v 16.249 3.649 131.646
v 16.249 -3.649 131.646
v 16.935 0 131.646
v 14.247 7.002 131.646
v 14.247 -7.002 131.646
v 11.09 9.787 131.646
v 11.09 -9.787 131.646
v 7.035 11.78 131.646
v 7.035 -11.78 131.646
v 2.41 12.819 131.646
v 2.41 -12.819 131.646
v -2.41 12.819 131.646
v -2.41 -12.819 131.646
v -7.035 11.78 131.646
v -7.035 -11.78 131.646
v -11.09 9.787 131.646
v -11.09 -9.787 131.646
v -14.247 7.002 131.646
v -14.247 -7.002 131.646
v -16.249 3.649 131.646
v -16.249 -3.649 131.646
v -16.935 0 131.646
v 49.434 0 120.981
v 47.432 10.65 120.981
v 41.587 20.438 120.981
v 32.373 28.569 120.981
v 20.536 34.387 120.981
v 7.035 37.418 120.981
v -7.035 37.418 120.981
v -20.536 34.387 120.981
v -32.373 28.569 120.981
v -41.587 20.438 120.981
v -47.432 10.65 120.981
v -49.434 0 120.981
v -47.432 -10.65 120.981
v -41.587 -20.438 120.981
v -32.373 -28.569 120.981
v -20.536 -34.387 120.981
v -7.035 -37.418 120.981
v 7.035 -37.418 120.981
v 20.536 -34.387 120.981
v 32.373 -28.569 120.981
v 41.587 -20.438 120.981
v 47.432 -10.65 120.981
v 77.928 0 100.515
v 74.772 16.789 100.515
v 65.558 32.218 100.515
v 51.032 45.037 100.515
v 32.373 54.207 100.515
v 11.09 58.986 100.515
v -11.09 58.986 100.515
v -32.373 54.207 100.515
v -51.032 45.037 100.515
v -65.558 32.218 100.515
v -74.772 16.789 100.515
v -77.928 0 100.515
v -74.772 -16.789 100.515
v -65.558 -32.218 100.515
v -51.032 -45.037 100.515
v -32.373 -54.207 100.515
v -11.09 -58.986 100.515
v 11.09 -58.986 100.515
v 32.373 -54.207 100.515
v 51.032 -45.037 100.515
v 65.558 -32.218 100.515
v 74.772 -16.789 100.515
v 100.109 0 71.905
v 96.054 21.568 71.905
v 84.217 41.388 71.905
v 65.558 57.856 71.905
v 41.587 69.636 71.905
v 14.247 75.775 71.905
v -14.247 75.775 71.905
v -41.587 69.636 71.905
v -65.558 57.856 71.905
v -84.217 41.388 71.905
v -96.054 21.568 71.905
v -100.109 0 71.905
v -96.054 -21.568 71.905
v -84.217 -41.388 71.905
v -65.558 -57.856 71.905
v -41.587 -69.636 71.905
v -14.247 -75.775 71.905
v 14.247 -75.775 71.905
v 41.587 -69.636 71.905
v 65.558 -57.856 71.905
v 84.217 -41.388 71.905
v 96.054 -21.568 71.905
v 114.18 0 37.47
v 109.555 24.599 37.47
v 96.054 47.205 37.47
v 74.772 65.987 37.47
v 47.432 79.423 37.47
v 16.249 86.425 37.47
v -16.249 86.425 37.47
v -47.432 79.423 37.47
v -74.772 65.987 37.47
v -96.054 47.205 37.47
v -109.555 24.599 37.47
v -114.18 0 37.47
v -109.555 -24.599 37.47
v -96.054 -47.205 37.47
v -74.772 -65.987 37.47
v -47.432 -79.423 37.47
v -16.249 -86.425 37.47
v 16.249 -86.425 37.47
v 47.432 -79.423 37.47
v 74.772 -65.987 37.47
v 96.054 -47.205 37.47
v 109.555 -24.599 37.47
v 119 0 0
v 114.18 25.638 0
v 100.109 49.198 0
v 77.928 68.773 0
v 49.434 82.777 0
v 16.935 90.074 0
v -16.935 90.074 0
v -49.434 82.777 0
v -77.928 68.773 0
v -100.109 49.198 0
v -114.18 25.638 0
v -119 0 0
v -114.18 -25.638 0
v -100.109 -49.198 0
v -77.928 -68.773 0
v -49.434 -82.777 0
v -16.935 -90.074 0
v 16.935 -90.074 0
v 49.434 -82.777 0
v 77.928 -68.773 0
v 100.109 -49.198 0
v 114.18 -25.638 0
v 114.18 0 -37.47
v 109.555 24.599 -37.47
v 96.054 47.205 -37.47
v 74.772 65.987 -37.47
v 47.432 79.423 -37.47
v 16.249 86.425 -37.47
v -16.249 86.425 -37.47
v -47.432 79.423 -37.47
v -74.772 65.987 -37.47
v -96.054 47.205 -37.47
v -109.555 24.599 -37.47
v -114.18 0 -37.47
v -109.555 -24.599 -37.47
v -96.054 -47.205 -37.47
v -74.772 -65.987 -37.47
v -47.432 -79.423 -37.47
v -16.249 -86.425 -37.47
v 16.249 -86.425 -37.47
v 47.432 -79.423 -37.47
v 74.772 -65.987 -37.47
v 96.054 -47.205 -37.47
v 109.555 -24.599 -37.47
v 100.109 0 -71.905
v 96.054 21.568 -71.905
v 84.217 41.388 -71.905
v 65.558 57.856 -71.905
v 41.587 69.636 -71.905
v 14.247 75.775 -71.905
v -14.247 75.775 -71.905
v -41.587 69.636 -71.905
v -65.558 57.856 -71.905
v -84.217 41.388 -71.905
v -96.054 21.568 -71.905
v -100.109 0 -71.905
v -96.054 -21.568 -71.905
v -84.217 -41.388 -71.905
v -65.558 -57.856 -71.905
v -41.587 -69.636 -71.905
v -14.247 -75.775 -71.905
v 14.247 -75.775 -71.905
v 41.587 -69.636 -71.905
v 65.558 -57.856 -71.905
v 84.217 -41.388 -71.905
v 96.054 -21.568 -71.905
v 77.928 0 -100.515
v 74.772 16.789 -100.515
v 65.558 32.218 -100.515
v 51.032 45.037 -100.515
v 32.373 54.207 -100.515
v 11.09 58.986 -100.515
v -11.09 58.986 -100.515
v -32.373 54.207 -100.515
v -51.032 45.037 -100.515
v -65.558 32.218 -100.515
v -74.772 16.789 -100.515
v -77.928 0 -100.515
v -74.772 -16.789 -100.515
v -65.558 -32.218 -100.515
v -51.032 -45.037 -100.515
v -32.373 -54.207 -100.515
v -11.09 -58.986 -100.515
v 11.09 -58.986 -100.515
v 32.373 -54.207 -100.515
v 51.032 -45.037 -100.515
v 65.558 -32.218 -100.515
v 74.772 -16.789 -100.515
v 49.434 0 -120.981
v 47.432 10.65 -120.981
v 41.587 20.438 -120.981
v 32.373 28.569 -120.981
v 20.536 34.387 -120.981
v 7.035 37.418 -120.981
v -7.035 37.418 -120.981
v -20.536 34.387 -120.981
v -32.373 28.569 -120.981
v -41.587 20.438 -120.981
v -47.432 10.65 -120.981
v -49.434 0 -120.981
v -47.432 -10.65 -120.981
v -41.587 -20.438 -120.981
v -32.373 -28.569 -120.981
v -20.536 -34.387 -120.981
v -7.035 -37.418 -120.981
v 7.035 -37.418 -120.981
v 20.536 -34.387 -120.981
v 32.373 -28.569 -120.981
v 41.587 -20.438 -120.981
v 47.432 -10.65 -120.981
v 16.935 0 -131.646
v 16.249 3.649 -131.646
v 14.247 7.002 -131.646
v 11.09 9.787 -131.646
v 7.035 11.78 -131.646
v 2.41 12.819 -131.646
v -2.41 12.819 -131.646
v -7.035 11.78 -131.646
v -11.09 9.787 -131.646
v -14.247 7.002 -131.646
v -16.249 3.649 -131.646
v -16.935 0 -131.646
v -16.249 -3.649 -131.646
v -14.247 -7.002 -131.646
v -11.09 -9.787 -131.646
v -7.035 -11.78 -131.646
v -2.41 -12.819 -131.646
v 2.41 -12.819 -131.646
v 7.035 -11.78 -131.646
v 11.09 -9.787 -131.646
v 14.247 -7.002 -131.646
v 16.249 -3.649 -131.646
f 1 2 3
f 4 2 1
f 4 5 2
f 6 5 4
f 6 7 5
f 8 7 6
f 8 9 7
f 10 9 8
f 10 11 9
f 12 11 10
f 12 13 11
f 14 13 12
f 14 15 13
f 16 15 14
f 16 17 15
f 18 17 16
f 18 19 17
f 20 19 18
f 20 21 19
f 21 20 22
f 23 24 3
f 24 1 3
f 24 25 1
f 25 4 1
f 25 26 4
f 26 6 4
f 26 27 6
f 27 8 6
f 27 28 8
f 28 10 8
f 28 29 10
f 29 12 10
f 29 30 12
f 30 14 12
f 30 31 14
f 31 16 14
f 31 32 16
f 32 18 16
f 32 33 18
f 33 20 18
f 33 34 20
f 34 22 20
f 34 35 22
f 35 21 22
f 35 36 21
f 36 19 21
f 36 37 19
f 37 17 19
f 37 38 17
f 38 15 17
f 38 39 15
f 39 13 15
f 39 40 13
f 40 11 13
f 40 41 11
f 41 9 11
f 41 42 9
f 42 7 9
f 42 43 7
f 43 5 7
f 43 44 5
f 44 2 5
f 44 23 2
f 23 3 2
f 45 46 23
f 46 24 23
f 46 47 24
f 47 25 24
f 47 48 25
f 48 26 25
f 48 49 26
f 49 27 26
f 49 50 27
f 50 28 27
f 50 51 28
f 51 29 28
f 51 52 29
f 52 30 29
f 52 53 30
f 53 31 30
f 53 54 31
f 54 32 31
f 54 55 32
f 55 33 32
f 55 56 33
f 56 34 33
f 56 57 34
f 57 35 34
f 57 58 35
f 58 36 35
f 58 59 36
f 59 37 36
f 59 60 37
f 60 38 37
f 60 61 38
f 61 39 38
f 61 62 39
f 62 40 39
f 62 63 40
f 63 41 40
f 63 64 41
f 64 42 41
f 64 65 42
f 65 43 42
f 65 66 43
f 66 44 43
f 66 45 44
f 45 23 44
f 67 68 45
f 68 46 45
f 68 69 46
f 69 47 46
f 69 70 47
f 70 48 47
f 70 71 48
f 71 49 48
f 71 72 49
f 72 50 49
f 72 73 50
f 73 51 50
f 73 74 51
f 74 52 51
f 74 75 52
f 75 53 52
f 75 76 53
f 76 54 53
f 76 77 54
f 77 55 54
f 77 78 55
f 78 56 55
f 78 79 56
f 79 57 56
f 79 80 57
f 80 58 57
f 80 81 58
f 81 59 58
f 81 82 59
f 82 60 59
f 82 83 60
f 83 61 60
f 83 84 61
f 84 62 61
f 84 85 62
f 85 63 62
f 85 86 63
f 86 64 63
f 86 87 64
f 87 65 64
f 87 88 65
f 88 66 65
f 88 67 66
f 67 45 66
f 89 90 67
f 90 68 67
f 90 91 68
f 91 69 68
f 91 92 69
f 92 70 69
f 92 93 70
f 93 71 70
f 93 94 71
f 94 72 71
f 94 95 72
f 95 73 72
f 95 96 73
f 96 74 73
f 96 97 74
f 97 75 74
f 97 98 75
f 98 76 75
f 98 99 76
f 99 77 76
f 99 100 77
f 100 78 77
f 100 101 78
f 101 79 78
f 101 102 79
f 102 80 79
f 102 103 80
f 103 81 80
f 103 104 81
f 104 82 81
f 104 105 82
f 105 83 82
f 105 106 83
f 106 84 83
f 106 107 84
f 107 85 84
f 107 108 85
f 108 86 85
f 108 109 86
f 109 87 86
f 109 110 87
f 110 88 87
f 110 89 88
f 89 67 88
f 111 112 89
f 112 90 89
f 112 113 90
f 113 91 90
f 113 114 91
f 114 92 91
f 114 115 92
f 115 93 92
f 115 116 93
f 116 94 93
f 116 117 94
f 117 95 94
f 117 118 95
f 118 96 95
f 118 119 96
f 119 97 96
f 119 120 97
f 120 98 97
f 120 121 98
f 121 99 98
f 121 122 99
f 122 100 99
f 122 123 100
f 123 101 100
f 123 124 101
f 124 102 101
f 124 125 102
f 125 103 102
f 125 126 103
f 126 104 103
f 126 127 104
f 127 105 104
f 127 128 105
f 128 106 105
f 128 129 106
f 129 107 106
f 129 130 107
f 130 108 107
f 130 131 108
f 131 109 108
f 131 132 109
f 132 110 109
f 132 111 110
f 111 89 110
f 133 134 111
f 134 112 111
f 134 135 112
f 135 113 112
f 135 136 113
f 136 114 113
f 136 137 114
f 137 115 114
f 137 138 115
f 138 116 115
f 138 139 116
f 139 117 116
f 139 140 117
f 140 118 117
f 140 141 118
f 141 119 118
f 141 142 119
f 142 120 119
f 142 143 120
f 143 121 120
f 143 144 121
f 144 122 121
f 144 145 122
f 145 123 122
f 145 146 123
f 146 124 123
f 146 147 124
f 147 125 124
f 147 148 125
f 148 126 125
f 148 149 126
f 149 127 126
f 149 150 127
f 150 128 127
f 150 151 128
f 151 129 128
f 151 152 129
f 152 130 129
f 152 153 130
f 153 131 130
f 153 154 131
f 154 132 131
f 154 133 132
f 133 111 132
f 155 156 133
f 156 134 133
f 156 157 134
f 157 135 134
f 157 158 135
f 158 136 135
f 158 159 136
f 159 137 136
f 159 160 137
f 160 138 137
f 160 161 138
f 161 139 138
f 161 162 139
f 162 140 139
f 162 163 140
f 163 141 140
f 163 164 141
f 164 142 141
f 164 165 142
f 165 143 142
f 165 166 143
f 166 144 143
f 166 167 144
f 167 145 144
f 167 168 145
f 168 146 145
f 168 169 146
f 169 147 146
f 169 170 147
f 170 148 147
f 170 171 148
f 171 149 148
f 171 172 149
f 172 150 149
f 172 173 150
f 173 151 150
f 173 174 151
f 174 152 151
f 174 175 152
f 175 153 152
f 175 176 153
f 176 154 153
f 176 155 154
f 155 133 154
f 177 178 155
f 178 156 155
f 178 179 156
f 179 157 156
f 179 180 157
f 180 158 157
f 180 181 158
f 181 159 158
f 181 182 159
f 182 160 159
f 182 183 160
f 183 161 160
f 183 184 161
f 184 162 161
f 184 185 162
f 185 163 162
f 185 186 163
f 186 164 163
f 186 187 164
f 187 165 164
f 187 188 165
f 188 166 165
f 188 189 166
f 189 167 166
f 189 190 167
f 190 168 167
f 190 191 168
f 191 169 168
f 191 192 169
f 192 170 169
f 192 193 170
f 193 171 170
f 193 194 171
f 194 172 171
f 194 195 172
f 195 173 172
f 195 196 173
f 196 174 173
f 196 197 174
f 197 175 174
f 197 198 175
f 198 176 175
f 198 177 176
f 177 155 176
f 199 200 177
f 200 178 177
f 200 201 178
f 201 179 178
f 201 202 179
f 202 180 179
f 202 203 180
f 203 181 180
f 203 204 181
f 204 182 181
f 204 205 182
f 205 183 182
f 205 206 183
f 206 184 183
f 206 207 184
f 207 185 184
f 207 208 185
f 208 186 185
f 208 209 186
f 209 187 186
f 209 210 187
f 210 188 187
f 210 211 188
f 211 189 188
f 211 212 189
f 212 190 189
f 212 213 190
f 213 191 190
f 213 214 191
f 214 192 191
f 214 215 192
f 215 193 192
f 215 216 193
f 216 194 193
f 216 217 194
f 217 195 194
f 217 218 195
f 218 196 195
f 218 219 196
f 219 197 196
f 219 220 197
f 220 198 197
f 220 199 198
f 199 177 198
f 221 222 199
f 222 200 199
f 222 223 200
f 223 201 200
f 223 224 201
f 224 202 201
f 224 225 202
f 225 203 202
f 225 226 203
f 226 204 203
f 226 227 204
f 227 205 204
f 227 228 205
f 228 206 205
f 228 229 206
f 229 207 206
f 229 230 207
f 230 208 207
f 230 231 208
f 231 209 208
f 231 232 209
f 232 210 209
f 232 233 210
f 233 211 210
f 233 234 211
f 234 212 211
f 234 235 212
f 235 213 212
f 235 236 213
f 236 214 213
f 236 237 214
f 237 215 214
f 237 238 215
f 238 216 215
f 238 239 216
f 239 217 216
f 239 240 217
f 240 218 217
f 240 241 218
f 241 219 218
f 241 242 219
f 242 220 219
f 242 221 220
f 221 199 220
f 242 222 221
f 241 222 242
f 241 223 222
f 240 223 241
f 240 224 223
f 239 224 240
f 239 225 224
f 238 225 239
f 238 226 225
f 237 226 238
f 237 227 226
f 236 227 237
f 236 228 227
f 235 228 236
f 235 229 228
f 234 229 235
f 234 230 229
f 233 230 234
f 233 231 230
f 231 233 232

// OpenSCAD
// Generated by SolidPython 1.0.1 on 2020-07-29 00:46:53


scale(v = [17, 13, 19]) {
	sphere(r = 7);
}
/***********************************************
*********      SolidPython code:      **********
************************************************
 
# import packages: SolidPython
from solid import *
from solid.utils import *
from itertools import chain, combinations, permutations


class Resize:

    def __init__(self, scad_file):
        self.scad_file = scad_file
        #self.scad_file = import_scad(scad_file)
        # cone/cylinder param:
        self.r1 = 0
        self.r2 = 0
        self.h = 0
        # rectangular prism param:
        self.w = 0
        self.l = 0
        # ellipse param:
        self.r = 0

    # import OpenScad code (file name corresponds to shape)


    # classify shape + parameters
    def assign(self, param1, param2, param3):
        if self.scad_file == 'cone.scad':
            self.r1 = param1
            self.r2 = param2
            self.h = param3
        elif self.scad_file == 'cylinder.scad':
            self.r1 = param1
            self.r2 = param2
            self.h = param3
        elif self.scad_file == 'rectangularPrism.scad':
            self.h = param1
            self.l = param2
            self.w = param3
        else:
            self.r = param1
            self.h = param2

    # resize parameters
    def iterate(self):
        x = range(3, 20, 2)
        i = 1
        if self.scad_file == 'cone.scad':
            tempList = list(permutations(x, 2))
            for temp in tempList:
                param1 = temp[0]
                param2 = temp[1]
                filepath = 'produced_scad_files/' + 'cone' + str(param1) + '_' + str(param2) + '_' + '.scad'
                scad_render_to_file(cylinder(h=param1, r1=param2, r2=0), filepath)

        elif self.scad_file == 'cylinder.scad':
            tempList = list(permutations(x, 3))
            for temp in tempList:
                param1 = temp[0]
                param2 = temp[1]
                filepath = 'produced_scad_files/' + 'cylinder' + str(param1) + '_' + str(param2) + '_' + '.scad'
                scad_render_to_file(cylinder(h=param1, r1=param2, r2=param2), filepath)

        elif self.scad_file == 'rectangularPrism.scad':
            tempList = list(permutations(x, 3))
            for temp in tempList:
                param1 = temp[0]
                param2 = temp[1]
                param3 = temp[2]
                filepath = 'produced_scad_files/' + 'rectangularPrism' + str(param1) + '_' + str(param2) + '_' + str(
                    param3) + '.scad'
                scad_render_to_file(cube(size=(param1, param2, param3)), filepath)

        elif self.scad_file == 'ellipse.scad':
            tempList = list(permutations(x, 4))
            for temp in tempList:
                param1 = temp[0]
                param2 = temp[1]
                param3 = temp[2]
                param4 = temp[3]
                filepath = 'produced_scad_files/' + 'ellipse' + str(param1) + '_' + str(param2) + '_' + str(param3) + '_' + str(param4) + '.scad'
                scad_render_to_file(scale([param1, param2, param3])(sphere(r=param4)), filepath)

    def render_to_scadfile(self):
        scad_render_to_file(scad, 'example.scad') 
 
************************************************/
